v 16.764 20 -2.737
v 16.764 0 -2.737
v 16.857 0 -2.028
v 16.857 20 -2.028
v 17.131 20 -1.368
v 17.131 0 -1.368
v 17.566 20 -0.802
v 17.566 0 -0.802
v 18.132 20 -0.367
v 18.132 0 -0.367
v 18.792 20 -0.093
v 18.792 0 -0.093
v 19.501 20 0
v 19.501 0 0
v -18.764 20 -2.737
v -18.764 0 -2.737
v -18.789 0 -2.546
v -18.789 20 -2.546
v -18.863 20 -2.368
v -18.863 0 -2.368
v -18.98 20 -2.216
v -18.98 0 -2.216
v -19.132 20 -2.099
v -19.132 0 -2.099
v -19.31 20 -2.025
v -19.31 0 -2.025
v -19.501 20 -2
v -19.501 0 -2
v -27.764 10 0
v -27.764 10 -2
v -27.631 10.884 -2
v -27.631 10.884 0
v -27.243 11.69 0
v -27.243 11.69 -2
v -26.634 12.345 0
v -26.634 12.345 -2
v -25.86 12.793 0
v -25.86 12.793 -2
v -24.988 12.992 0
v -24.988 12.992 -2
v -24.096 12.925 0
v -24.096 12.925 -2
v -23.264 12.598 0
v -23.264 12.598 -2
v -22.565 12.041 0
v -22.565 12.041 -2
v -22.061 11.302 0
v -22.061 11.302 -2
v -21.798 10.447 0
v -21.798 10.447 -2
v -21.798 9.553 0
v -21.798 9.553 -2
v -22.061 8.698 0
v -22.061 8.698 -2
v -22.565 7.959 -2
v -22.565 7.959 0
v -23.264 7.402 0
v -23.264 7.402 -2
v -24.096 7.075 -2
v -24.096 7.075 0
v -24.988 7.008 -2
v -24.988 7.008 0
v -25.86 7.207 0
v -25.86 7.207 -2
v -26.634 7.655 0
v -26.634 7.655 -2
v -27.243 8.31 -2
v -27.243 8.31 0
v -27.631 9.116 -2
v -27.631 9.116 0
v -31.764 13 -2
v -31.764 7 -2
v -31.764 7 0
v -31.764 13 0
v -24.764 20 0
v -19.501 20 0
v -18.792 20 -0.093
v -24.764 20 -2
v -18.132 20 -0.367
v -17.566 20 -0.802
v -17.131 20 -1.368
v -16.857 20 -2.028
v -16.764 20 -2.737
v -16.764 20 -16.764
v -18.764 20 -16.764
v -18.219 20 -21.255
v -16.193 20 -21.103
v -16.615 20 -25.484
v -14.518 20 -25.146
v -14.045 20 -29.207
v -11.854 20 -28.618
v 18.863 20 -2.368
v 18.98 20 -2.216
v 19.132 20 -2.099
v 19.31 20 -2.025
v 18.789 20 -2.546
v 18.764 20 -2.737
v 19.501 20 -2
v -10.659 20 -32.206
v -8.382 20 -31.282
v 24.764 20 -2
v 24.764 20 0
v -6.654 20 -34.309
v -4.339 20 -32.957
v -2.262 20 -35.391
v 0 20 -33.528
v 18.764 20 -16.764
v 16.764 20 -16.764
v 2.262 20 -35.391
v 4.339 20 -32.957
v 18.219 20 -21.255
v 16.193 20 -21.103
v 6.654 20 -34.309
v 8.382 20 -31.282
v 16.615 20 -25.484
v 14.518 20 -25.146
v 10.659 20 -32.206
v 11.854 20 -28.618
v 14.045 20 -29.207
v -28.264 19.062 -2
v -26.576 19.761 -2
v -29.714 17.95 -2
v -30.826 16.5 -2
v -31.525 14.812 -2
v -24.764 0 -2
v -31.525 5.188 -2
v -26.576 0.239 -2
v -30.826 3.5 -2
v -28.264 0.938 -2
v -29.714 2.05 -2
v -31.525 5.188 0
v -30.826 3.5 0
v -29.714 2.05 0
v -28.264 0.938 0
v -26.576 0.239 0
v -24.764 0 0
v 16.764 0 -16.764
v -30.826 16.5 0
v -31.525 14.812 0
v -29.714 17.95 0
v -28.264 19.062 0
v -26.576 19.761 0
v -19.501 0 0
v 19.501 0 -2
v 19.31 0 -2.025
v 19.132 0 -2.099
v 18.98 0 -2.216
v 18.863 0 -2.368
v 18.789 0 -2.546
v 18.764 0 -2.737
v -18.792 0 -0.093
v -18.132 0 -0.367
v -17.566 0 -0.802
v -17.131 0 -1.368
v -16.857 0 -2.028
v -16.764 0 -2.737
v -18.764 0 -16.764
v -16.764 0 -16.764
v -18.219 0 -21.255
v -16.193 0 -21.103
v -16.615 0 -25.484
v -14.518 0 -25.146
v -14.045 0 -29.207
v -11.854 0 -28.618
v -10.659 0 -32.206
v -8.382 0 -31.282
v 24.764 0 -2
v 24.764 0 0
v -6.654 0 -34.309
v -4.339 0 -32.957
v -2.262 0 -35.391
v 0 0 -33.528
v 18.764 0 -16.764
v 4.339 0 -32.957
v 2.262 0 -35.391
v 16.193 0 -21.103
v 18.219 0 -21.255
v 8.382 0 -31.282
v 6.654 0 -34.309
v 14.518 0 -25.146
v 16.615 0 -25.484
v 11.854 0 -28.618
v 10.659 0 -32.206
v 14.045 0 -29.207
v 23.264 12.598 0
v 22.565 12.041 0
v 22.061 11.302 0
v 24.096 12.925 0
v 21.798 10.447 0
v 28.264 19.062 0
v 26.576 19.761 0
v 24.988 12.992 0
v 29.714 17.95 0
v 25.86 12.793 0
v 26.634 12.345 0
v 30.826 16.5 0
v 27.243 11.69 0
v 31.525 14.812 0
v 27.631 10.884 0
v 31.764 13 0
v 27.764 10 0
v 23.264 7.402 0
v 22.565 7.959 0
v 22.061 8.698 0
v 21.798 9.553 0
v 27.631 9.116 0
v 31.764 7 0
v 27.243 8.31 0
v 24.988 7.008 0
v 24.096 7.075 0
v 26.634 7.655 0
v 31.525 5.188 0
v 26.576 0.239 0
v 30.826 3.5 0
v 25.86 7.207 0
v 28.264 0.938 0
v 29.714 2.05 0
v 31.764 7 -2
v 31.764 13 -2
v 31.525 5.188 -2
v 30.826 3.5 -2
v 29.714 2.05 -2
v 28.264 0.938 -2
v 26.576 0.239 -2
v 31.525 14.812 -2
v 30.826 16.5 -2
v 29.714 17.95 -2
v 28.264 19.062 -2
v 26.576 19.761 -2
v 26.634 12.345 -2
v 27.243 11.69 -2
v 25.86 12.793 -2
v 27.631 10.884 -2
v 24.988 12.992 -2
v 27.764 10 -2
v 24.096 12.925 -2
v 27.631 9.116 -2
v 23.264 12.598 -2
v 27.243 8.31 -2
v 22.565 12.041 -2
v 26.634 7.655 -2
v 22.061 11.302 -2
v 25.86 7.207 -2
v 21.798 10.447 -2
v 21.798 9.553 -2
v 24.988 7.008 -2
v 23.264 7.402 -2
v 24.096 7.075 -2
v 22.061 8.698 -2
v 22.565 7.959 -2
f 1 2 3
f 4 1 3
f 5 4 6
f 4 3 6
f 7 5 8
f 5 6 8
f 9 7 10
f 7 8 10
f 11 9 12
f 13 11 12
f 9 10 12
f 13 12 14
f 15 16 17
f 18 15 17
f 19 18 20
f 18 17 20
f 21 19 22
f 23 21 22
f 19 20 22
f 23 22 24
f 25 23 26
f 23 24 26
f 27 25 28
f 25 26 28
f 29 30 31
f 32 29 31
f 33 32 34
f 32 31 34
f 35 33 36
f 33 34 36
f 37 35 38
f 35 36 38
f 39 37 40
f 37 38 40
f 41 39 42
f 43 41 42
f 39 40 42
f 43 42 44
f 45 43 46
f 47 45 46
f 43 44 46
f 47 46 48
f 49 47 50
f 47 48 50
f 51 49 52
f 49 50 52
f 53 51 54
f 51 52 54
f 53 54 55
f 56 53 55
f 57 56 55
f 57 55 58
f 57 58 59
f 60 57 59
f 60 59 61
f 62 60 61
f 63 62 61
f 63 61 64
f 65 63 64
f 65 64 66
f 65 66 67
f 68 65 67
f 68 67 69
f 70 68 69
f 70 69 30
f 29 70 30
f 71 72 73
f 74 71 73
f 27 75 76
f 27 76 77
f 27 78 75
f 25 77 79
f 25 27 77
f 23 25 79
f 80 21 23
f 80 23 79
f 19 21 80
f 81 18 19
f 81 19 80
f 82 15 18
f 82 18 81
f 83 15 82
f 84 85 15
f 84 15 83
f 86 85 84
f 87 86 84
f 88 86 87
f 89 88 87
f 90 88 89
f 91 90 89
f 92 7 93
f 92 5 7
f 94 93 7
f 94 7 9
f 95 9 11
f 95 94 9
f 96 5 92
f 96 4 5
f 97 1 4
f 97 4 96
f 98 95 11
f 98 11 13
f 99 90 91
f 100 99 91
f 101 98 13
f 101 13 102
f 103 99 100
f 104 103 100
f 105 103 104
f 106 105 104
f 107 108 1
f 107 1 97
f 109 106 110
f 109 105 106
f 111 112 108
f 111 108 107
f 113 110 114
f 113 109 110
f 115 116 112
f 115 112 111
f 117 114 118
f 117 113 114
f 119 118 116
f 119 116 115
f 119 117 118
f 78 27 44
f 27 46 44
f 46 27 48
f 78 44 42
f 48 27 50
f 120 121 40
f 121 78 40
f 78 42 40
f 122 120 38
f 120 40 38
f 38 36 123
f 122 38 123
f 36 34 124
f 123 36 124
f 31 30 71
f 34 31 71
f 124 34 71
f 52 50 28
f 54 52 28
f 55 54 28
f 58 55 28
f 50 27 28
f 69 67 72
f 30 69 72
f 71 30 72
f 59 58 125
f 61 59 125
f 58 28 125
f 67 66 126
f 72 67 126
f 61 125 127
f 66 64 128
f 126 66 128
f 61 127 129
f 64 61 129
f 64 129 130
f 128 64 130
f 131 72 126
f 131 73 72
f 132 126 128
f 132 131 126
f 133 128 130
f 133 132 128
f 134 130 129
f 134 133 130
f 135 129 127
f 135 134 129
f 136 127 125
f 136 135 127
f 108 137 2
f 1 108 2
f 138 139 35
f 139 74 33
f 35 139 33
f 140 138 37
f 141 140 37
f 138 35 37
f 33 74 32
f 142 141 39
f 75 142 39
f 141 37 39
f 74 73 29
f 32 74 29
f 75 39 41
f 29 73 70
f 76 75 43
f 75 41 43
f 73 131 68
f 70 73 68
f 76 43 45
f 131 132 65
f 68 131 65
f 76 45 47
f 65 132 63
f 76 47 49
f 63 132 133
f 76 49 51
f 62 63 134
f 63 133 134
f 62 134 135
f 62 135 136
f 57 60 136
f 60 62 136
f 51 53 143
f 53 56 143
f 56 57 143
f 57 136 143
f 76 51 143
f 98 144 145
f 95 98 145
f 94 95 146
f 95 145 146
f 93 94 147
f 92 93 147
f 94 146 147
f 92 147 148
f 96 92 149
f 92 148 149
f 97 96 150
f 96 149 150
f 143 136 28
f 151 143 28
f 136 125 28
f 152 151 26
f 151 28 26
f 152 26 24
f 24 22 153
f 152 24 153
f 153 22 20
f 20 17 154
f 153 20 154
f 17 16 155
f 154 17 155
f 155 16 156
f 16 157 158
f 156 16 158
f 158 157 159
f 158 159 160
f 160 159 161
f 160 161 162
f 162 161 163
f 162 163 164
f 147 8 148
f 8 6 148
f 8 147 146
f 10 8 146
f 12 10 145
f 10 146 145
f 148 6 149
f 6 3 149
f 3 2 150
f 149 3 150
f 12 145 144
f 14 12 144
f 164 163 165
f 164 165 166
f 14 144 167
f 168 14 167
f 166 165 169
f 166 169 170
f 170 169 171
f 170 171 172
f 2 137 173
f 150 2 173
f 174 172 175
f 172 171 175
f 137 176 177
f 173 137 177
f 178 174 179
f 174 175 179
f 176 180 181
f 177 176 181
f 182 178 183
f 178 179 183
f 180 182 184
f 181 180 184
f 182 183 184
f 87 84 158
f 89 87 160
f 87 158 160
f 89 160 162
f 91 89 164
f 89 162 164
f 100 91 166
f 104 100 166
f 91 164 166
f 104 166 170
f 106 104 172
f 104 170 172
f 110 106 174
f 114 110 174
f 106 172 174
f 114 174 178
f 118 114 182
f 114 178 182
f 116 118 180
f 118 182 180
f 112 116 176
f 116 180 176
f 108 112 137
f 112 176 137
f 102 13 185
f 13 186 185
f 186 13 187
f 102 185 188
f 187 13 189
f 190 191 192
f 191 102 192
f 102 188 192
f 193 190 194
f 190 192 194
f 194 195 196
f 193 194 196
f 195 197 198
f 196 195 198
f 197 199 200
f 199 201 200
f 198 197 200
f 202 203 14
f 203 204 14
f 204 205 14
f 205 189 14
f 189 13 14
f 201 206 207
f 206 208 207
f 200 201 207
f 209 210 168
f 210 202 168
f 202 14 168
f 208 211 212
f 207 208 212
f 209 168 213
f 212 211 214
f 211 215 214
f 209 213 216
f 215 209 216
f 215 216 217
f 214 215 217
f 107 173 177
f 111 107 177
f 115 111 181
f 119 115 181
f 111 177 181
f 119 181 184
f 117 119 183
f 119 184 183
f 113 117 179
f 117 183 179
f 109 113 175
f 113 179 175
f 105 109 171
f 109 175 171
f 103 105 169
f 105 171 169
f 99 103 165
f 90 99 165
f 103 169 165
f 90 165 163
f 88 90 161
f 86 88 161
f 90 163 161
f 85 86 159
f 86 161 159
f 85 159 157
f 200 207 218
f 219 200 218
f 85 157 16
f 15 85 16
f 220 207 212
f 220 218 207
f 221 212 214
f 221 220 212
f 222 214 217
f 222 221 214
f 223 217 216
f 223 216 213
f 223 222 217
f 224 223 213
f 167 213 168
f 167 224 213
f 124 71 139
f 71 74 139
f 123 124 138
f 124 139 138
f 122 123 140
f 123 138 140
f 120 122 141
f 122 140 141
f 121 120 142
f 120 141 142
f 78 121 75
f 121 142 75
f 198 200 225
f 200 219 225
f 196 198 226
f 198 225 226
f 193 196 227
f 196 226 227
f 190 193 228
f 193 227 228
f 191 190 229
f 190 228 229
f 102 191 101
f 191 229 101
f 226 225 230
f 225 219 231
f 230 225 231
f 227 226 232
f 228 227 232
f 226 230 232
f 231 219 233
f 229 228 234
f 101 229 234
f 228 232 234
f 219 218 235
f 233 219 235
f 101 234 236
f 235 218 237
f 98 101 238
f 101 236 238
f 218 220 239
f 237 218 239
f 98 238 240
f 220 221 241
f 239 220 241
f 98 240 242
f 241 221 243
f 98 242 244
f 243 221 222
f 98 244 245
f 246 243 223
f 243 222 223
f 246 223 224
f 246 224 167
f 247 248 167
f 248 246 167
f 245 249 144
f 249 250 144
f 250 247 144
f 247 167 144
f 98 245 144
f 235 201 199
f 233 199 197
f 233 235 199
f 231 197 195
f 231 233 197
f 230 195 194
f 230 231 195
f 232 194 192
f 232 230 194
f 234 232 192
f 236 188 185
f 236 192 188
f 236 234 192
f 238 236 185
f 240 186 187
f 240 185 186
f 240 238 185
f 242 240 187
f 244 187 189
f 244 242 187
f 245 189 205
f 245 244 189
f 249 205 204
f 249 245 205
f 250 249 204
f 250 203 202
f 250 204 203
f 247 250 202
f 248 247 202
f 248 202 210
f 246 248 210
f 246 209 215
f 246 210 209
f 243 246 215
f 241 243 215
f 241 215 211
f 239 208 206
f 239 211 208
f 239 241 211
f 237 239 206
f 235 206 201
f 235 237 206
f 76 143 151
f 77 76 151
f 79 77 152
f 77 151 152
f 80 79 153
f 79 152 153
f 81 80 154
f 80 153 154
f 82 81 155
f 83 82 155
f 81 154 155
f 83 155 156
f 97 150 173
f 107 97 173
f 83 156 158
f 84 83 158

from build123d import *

# Parameters (mm, degrees)
BASE_FLANGE2_DEPTH = 20
FILLET1_R          = 7
SKETCH17_R         = 3
CUT_EXTRUDE1_DEPTH = 51.329697794


# Sheet-metal steps are written as plain solids
with BuildPart() as part:
    # Sketch12 → Base-Flange2 (new body)
    with BuildSketch(Plane(origin=(0, 0, 0), x_dir=(1, 0, 0), z_dir=(0, 1, 0))):
        with BuildLine():
            Line((-31.764, 0), (-19.5006, 0))
            ThreePointArc((-19.5006, 0), (-17.565531583, 0.801531583), (-16.764, 2.7366))
            Line((-16.764, 2.7366), (-16.764, 16.764))
            ThreePointArc((-16.764, 16.764), (0, 33.528), (16.764, 16.764))
            Line((16.764, 16.764), (16.764, 2.7366))
            ThreePointArc((16.764, 2.7366), (17.565531583, 0.801531583), (19.5006, 0))
            Line((19.5006, 0), (31.764, 0))
            Line((31.764, 0), (31.764, 2))
            Line((31.764, 2), (19.5006, 2))
            ThreePointArc((19.5006, 2), (18.979745145, 2.215745145), (18.764, 2.7366))
            Line((18.764, 2.7366), (18.764, 16.764))
            ThreePointArc((18.764, 16.764), (0, 35.528), (-18.764, 16.764))
            Line((-18.764, 16.764), (-18.764, 2.7366))
            ThreePointArc((-18.764, 2.7366), (-18.979745145, 2.215745145), (-19.5006, 2))
            Line((-19.5006, 2), (-31.764, 2))
            Line((-31.764, 2), (-31.764, 0))
        make_face()
    extrude(amount=BASE_FLANGE2_DEPTH)

    # Fillet1
    fillet1_edges = [part.edges().sort_by_distance(p)[0] for p in [
        (-31.764, 0, -1),
        (31.764, 0, -1),
        (-31.764, 20, -1),
        (31.764, 20, -1),
    ]]
    fillet(fillet1_edges, radius=FILLET1_R)

    # Sketch17 → Cut-Extrude1 (cut, through all)
    with BuildSketch(Plane(origin=(0, 0, -2), x_dir=(-1, 0, 0), z_dir=(0, 0, -1))):
        with Locations((24.764, 10)):
            Circle(SKETCH17_R)
    cut_extrude1 = extrude(amount=-CUT_EXTRUDE1_DEPTH, mode=Mode.SUBTRACT)

    # Mirror1: Cut-Extrude1 across plane
    add(cut_extrude1.mirror(Plane(origin=(0, 0, 0), x_dir=(0, 0, 1), z_dir=(1, 0, 0))), mode=Mode.SUBTRACT)


solid = part.part
